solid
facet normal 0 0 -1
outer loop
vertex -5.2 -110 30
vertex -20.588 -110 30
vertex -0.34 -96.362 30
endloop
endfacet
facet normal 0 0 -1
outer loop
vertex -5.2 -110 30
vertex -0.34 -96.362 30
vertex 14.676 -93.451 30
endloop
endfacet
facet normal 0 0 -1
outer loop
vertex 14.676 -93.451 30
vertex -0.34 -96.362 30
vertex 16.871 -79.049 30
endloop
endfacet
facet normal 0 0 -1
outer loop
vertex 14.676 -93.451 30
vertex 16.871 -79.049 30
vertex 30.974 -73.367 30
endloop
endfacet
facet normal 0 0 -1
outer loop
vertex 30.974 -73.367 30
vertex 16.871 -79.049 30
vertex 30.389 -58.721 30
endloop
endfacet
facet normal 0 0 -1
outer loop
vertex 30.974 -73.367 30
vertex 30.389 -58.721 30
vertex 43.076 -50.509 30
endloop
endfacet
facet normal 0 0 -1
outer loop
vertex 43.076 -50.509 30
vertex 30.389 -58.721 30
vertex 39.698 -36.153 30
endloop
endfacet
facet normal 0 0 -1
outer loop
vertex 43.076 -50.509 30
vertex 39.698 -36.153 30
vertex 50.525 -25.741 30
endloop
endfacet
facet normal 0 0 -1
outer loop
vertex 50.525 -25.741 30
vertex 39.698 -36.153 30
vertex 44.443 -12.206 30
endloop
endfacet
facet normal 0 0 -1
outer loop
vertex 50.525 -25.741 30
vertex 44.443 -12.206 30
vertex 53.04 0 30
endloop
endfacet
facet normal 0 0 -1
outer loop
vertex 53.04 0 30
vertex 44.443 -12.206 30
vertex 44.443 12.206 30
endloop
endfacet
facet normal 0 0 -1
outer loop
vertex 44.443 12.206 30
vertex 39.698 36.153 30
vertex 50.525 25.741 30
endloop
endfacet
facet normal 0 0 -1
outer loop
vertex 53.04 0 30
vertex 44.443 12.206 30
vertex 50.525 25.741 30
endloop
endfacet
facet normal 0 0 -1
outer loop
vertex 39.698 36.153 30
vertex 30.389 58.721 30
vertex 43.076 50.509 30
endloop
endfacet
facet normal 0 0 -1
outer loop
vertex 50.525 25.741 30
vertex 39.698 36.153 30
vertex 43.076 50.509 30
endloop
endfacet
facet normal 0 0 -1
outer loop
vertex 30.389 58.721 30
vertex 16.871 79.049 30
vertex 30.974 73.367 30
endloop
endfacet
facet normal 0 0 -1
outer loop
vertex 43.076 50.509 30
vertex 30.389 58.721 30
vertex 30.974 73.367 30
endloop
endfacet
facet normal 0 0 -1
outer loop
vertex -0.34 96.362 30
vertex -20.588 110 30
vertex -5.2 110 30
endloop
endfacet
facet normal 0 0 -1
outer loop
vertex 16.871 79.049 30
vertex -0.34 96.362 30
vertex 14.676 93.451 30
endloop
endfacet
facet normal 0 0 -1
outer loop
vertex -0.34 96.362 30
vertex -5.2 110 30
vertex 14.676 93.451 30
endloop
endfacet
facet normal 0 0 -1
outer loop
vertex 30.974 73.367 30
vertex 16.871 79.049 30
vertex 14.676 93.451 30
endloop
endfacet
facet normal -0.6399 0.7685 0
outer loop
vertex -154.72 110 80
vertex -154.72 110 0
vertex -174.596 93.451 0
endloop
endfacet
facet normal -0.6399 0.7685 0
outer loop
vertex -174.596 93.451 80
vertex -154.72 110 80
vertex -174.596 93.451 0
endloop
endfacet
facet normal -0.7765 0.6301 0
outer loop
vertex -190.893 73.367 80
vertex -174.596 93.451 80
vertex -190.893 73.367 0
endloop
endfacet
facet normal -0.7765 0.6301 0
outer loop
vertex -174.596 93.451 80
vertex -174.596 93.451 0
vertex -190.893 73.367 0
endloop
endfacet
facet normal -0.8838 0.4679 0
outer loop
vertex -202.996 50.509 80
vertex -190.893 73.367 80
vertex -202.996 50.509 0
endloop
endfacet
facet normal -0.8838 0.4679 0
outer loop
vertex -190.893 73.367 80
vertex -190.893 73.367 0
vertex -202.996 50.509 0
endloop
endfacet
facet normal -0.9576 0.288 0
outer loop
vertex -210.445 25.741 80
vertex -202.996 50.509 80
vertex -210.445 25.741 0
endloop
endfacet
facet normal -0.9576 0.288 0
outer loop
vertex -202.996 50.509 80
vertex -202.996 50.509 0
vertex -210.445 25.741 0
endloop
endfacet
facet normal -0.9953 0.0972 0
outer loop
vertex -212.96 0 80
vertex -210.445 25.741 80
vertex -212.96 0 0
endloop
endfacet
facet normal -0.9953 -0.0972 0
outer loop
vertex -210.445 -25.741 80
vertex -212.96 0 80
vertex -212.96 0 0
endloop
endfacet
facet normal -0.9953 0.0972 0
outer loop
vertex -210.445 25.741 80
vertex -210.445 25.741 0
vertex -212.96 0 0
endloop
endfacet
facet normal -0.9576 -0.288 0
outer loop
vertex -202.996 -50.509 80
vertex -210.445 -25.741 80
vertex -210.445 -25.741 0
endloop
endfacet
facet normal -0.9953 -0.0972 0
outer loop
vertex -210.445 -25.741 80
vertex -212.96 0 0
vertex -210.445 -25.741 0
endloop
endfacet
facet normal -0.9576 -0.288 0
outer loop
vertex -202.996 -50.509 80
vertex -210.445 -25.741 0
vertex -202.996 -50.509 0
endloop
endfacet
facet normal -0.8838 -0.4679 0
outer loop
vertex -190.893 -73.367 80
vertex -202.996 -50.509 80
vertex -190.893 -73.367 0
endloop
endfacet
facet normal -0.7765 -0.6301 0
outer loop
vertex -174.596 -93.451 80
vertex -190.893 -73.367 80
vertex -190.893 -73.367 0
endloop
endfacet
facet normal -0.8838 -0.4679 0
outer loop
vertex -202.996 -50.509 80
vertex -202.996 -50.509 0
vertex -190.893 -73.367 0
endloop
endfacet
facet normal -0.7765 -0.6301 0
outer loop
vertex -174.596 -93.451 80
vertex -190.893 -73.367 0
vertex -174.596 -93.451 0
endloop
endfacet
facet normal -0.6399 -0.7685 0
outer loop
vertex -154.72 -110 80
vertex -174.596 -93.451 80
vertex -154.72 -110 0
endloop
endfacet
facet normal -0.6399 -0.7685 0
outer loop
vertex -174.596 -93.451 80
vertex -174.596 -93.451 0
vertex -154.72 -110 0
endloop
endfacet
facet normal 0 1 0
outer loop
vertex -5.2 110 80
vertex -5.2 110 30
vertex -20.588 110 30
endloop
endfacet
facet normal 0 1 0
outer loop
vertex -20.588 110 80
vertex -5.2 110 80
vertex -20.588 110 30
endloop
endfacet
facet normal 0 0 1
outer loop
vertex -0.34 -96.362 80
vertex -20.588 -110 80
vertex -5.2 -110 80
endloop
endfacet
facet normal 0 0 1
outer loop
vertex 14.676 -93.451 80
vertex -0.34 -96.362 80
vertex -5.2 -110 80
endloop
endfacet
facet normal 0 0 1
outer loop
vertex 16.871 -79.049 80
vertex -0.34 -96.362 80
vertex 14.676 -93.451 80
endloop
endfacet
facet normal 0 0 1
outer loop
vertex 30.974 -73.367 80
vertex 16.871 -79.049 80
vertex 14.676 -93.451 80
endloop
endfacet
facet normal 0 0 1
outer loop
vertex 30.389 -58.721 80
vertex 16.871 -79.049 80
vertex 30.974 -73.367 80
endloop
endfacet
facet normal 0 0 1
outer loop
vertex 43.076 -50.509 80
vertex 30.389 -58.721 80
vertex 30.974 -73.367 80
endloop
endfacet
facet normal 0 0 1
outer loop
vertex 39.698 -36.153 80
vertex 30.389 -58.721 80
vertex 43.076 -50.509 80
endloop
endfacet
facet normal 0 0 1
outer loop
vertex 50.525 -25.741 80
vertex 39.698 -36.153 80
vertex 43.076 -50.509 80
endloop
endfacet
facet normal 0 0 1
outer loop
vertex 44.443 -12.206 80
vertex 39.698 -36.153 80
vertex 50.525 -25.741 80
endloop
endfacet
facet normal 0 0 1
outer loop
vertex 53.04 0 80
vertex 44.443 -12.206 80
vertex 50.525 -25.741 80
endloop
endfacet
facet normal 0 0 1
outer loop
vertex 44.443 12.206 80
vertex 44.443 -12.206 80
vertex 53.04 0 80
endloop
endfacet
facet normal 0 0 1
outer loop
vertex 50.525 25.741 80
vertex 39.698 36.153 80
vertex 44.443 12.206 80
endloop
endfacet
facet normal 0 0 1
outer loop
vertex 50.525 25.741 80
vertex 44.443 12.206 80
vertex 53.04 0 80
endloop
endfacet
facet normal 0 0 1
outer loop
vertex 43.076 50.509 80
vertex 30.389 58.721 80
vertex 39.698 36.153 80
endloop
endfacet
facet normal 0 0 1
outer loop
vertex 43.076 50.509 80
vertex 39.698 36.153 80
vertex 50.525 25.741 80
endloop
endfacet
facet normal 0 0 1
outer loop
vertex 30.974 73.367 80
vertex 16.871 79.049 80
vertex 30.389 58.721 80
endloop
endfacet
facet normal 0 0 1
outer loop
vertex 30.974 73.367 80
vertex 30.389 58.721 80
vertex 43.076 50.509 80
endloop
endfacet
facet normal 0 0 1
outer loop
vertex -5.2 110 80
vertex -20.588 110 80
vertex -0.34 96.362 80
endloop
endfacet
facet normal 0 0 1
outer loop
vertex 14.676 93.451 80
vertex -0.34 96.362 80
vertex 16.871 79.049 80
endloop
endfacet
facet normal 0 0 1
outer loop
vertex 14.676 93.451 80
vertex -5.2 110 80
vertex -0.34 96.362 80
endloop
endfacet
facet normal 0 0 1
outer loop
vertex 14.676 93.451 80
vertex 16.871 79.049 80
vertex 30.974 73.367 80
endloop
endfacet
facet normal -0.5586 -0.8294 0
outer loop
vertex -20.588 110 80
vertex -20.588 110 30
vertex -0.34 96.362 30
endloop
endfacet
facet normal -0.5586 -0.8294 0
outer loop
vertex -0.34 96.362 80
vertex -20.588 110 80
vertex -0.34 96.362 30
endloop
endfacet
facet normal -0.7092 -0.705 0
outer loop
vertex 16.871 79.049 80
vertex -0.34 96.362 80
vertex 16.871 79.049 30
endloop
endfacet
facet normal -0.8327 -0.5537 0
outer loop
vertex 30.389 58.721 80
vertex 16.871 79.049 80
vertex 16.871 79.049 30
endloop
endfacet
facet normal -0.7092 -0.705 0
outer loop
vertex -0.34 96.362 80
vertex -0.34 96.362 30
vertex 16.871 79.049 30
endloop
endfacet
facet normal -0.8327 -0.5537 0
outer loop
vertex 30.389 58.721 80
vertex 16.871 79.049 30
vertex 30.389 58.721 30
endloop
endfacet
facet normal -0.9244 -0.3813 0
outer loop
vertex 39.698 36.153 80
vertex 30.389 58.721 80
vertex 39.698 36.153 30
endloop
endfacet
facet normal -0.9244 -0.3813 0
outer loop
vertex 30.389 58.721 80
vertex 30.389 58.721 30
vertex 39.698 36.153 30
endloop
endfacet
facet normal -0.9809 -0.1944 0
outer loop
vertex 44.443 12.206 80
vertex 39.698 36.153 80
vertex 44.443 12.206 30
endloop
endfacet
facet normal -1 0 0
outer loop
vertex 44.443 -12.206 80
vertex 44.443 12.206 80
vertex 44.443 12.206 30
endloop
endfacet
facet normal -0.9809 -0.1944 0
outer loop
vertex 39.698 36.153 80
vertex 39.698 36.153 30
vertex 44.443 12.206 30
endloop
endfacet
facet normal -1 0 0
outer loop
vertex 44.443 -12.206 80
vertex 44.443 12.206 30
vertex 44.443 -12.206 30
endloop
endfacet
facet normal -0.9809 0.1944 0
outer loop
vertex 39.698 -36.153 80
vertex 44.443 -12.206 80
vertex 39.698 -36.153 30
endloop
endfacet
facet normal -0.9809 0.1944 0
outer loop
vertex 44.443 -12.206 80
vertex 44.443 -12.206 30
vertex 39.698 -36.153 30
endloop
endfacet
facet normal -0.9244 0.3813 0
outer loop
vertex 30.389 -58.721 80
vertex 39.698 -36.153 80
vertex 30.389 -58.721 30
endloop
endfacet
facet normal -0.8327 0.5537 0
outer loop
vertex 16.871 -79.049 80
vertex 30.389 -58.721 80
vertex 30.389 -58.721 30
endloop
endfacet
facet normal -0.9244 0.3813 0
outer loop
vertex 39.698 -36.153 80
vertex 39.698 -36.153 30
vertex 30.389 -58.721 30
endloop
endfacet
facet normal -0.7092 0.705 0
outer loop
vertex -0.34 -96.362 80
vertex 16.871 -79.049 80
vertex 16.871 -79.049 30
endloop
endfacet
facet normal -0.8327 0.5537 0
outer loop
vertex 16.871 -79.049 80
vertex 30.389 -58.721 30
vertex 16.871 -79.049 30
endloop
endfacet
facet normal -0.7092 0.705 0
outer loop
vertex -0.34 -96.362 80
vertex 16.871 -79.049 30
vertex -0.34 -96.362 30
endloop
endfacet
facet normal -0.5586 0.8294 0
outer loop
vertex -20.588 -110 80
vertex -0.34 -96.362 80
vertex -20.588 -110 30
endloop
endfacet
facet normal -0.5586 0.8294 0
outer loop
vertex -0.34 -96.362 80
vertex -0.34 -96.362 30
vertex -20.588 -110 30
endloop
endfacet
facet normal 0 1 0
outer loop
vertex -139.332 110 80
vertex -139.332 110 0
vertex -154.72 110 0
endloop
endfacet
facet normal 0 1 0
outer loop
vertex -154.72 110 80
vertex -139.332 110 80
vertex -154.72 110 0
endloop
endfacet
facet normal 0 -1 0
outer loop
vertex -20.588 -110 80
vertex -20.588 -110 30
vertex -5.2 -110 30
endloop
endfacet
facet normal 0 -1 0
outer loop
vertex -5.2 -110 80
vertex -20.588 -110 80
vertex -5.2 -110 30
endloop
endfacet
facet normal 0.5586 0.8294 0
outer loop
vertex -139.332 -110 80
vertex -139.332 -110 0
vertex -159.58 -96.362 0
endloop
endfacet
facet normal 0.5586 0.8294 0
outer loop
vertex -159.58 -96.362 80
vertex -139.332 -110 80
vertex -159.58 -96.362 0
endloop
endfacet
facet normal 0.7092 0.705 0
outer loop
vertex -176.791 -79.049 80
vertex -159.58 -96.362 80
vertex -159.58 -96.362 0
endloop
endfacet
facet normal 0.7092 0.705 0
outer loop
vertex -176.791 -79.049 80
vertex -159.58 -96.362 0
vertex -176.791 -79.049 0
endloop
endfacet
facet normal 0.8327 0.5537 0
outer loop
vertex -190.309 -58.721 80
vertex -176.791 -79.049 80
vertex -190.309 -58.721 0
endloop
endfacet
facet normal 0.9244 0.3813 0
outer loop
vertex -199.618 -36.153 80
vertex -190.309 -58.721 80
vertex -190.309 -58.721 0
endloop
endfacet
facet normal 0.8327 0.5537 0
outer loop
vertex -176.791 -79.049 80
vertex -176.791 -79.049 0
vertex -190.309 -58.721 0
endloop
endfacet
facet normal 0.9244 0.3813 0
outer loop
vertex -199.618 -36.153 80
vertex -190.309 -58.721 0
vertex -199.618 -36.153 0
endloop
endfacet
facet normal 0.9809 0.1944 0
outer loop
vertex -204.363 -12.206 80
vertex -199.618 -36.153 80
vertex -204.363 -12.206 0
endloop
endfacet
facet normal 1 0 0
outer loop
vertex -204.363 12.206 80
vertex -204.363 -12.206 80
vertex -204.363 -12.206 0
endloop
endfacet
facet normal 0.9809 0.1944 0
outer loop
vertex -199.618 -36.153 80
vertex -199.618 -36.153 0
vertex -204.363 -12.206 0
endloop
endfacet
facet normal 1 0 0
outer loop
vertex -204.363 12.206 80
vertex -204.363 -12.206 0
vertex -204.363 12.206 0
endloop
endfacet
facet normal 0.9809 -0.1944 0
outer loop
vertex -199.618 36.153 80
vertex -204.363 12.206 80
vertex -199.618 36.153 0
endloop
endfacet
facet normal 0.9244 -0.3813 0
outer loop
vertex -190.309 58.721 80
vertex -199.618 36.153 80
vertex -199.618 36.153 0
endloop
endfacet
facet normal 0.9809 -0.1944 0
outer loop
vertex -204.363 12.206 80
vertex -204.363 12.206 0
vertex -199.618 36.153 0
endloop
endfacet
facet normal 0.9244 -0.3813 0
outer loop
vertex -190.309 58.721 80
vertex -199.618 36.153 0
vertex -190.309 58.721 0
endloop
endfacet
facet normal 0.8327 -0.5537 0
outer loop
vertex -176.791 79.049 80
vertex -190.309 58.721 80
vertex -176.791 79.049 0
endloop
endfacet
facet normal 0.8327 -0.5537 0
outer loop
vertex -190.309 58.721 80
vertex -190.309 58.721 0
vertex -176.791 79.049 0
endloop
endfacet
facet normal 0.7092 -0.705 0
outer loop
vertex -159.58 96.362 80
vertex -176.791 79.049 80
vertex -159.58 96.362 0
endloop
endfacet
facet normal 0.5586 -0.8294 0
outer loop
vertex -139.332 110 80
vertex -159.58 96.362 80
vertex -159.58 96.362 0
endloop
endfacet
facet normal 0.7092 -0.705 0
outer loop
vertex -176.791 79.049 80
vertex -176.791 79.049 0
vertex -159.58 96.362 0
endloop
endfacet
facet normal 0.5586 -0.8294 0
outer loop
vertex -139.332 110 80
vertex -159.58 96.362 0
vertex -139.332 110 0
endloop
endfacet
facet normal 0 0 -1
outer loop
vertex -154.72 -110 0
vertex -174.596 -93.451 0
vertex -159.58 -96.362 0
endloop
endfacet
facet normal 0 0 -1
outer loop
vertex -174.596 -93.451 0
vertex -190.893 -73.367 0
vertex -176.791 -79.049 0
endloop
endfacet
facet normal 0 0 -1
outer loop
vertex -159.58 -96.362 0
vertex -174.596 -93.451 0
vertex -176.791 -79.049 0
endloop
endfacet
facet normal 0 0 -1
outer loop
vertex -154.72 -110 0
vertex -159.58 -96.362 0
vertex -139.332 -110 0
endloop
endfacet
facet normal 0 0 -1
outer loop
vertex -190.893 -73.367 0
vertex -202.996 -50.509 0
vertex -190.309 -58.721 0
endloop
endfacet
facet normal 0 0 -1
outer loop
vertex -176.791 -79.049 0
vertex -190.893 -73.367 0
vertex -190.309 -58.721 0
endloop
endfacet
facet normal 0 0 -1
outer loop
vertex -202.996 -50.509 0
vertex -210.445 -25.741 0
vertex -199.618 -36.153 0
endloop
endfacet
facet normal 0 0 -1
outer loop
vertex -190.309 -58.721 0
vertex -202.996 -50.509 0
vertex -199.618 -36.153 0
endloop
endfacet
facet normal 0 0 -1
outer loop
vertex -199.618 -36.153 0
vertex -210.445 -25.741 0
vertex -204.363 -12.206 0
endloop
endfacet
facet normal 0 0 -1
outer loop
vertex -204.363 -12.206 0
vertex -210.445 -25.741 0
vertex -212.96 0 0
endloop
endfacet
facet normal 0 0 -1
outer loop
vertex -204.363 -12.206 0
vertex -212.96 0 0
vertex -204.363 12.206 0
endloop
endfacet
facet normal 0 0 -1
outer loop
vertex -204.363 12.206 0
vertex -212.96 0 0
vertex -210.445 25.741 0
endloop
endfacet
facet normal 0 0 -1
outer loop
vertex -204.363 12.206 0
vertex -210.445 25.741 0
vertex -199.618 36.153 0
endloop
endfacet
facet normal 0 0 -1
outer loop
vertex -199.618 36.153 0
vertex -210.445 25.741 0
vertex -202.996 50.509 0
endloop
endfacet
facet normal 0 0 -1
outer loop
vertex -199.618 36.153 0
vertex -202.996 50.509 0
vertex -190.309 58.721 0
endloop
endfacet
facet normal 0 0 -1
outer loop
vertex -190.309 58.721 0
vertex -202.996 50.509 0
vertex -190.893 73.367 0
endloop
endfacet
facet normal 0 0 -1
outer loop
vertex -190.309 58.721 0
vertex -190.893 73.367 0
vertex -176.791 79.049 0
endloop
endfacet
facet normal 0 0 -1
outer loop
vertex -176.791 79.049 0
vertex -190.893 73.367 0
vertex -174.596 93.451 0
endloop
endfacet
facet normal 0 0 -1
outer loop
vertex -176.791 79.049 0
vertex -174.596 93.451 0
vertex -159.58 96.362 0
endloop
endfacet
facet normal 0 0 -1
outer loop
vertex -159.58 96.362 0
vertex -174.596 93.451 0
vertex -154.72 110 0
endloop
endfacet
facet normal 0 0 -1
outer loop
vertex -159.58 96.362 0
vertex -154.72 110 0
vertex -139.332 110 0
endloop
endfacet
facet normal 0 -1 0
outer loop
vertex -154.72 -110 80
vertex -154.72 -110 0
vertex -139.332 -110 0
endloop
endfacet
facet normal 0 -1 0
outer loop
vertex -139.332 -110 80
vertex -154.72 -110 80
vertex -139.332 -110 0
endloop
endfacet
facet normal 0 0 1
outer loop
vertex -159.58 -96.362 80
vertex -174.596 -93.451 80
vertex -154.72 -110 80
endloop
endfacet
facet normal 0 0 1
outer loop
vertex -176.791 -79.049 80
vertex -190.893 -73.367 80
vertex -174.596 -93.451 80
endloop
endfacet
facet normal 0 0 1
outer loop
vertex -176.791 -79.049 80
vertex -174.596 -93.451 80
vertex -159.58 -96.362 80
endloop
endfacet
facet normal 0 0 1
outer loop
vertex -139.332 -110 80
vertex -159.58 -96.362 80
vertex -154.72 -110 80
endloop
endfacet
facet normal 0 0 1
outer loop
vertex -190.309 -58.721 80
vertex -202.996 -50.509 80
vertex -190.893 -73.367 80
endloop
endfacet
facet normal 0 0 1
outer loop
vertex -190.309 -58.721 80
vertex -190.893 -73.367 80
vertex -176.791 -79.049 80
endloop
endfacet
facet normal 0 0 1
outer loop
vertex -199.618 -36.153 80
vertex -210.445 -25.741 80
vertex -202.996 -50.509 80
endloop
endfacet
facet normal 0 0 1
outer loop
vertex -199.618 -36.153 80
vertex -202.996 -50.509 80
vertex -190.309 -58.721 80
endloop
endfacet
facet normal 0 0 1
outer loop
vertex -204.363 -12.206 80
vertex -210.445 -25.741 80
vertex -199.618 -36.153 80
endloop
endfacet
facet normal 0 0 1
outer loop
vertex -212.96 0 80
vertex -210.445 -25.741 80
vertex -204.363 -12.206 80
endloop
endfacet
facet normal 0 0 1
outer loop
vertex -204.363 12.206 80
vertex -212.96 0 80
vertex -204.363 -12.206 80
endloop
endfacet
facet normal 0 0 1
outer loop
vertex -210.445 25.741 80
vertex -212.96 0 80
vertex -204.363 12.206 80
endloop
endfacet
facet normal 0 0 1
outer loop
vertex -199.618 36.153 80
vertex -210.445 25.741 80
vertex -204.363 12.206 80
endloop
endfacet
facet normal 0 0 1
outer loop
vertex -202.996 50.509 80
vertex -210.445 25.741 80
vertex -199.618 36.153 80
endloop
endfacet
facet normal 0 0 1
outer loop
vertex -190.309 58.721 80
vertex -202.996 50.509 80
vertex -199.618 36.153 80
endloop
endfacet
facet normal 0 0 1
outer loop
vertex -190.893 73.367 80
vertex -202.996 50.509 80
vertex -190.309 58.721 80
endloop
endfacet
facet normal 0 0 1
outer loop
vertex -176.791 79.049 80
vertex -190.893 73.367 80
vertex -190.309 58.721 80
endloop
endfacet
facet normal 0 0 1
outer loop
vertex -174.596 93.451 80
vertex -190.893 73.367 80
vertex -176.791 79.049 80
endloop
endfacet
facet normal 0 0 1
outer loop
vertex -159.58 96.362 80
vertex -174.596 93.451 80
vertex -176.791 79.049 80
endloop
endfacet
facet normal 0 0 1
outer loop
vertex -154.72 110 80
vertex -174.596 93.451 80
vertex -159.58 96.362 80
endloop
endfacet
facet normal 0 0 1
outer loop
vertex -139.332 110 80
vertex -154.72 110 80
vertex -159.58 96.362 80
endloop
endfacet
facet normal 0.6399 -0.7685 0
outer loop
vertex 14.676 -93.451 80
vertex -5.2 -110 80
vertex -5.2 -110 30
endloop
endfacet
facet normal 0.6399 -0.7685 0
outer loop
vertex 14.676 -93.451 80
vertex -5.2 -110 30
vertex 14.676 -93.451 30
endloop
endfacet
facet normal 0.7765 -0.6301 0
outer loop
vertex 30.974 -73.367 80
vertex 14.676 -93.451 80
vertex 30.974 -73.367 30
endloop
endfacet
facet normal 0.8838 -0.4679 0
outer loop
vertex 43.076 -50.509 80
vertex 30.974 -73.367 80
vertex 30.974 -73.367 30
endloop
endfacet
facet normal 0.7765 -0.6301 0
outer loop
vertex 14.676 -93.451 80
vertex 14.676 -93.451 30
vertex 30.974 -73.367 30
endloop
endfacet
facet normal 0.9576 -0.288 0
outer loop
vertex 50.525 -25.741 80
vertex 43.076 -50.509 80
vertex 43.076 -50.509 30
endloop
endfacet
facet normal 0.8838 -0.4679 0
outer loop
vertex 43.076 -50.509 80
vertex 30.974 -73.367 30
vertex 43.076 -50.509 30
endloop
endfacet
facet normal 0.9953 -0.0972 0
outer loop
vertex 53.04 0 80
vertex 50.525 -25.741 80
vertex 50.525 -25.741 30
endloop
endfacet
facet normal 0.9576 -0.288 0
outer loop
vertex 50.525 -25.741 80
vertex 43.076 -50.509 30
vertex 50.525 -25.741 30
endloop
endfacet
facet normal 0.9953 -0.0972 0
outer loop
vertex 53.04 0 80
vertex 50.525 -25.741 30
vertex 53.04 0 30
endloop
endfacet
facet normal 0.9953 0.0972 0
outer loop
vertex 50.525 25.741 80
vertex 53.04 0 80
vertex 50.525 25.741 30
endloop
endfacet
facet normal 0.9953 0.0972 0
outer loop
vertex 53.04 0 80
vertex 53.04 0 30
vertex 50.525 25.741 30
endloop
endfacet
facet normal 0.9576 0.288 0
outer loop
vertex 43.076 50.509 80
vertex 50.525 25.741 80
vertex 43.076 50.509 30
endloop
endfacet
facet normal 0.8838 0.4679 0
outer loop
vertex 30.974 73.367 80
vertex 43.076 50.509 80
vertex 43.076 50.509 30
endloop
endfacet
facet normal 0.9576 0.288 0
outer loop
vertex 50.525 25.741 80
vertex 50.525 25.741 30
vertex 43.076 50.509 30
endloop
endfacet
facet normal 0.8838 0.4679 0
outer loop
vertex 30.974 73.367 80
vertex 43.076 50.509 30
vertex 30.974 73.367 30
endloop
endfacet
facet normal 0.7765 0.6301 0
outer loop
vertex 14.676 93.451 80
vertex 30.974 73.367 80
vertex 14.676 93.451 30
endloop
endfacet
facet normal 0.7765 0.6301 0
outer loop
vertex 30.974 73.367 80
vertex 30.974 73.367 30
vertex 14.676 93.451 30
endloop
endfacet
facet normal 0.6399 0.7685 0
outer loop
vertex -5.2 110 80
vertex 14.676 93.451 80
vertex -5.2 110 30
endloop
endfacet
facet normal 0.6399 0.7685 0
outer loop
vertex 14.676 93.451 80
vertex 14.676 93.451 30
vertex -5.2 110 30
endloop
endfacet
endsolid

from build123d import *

# Parameters (mm, degrees)
F1_DEPTH = 80
F2_DEPTH = 30


with BuildPart() as f1:
    # F0 (on Top) → F1 (new body)
    with BuildSketch(Plane.XY):
        with BuildLine():
            ThreePointArc((-139.3316096223, -110), (-204.9598991871, 0), (-139.3316096223, 110))
            Line((-139.3316096223, 110), (-154.7195139534, 110))
            ThreePointArc((-154.7195139534, 110), (-212.9598991871, 0), (-154.7195139534, -110))
            Line((-154.7195139534, -110), (-139.3316096223, -110))
        make_face()
    extrude(amount=F1_DEPTH)


with BuildPart() as f1b:
    # F0 (on Top) → F1, piece 2 (new body)
    with BuildSketch(Plane.XY):
        with BuildLine():
            Line((-5.2002844208, 110), (-20.5881887519, 110))
            ThreePointArc((-20.5881887519, 110), (45.0401008129, 0), (-20.5881887519, -110))
            Line((-20.5881887519, -110), (-5.2002844208, -110))
            ThreePointArc((-5.2002844208, -110), (53.0401008129, 0), (-5.2002844208, 110))
        make_face()
    extrude(amount=F1_DEPTH)

    # F2 (cut): a face of the model
    f2_faces = [f1b.faces().sort_by_distance(p)[0] for p in [
        (-12.8942365864, -107.6800619615, 0),
    ]]
    extrude(f2_faces, amount=-F2_DEPTH, mode=Mode.SUBTRACT)


solid = Compound([f1.part, f1b.part])
